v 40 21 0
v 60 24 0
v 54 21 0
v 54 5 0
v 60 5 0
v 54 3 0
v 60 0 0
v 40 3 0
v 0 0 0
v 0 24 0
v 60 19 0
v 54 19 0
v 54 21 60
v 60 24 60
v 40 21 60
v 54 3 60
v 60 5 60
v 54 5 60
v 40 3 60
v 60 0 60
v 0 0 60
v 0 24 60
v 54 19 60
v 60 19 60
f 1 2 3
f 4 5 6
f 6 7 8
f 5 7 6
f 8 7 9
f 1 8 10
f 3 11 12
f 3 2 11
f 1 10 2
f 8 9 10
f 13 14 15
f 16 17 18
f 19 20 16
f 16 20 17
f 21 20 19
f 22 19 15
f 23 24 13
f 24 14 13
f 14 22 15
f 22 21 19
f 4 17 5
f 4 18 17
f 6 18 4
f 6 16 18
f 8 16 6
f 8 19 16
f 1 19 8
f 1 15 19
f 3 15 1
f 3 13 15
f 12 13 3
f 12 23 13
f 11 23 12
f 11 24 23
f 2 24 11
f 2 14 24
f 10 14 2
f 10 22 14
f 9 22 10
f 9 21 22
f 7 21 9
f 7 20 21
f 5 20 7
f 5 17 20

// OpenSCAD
$fn = 32;

// ----------------------------------------------------------------------
// T-slot rail: 60 x 24 mm section, 60 mm long
// ----------------------------------------------------------------------

// --- parameters (mm) ---
profile_height = 60;      // extrusion height
profile_points = 12;      // points of the closed outline

profile = [[0, 0], [60, 0], [60, 5], [54, 5], [54, 3], [40, 3], [40, 21], [54, 21], [54, 19], [60, 19], [60, 24], [0, 24]];  // single closed polygon, 12 points, counter clockwise

// --- the one profile operation ---
linear_extrude(height = profile_height) polygon(points = profile);
